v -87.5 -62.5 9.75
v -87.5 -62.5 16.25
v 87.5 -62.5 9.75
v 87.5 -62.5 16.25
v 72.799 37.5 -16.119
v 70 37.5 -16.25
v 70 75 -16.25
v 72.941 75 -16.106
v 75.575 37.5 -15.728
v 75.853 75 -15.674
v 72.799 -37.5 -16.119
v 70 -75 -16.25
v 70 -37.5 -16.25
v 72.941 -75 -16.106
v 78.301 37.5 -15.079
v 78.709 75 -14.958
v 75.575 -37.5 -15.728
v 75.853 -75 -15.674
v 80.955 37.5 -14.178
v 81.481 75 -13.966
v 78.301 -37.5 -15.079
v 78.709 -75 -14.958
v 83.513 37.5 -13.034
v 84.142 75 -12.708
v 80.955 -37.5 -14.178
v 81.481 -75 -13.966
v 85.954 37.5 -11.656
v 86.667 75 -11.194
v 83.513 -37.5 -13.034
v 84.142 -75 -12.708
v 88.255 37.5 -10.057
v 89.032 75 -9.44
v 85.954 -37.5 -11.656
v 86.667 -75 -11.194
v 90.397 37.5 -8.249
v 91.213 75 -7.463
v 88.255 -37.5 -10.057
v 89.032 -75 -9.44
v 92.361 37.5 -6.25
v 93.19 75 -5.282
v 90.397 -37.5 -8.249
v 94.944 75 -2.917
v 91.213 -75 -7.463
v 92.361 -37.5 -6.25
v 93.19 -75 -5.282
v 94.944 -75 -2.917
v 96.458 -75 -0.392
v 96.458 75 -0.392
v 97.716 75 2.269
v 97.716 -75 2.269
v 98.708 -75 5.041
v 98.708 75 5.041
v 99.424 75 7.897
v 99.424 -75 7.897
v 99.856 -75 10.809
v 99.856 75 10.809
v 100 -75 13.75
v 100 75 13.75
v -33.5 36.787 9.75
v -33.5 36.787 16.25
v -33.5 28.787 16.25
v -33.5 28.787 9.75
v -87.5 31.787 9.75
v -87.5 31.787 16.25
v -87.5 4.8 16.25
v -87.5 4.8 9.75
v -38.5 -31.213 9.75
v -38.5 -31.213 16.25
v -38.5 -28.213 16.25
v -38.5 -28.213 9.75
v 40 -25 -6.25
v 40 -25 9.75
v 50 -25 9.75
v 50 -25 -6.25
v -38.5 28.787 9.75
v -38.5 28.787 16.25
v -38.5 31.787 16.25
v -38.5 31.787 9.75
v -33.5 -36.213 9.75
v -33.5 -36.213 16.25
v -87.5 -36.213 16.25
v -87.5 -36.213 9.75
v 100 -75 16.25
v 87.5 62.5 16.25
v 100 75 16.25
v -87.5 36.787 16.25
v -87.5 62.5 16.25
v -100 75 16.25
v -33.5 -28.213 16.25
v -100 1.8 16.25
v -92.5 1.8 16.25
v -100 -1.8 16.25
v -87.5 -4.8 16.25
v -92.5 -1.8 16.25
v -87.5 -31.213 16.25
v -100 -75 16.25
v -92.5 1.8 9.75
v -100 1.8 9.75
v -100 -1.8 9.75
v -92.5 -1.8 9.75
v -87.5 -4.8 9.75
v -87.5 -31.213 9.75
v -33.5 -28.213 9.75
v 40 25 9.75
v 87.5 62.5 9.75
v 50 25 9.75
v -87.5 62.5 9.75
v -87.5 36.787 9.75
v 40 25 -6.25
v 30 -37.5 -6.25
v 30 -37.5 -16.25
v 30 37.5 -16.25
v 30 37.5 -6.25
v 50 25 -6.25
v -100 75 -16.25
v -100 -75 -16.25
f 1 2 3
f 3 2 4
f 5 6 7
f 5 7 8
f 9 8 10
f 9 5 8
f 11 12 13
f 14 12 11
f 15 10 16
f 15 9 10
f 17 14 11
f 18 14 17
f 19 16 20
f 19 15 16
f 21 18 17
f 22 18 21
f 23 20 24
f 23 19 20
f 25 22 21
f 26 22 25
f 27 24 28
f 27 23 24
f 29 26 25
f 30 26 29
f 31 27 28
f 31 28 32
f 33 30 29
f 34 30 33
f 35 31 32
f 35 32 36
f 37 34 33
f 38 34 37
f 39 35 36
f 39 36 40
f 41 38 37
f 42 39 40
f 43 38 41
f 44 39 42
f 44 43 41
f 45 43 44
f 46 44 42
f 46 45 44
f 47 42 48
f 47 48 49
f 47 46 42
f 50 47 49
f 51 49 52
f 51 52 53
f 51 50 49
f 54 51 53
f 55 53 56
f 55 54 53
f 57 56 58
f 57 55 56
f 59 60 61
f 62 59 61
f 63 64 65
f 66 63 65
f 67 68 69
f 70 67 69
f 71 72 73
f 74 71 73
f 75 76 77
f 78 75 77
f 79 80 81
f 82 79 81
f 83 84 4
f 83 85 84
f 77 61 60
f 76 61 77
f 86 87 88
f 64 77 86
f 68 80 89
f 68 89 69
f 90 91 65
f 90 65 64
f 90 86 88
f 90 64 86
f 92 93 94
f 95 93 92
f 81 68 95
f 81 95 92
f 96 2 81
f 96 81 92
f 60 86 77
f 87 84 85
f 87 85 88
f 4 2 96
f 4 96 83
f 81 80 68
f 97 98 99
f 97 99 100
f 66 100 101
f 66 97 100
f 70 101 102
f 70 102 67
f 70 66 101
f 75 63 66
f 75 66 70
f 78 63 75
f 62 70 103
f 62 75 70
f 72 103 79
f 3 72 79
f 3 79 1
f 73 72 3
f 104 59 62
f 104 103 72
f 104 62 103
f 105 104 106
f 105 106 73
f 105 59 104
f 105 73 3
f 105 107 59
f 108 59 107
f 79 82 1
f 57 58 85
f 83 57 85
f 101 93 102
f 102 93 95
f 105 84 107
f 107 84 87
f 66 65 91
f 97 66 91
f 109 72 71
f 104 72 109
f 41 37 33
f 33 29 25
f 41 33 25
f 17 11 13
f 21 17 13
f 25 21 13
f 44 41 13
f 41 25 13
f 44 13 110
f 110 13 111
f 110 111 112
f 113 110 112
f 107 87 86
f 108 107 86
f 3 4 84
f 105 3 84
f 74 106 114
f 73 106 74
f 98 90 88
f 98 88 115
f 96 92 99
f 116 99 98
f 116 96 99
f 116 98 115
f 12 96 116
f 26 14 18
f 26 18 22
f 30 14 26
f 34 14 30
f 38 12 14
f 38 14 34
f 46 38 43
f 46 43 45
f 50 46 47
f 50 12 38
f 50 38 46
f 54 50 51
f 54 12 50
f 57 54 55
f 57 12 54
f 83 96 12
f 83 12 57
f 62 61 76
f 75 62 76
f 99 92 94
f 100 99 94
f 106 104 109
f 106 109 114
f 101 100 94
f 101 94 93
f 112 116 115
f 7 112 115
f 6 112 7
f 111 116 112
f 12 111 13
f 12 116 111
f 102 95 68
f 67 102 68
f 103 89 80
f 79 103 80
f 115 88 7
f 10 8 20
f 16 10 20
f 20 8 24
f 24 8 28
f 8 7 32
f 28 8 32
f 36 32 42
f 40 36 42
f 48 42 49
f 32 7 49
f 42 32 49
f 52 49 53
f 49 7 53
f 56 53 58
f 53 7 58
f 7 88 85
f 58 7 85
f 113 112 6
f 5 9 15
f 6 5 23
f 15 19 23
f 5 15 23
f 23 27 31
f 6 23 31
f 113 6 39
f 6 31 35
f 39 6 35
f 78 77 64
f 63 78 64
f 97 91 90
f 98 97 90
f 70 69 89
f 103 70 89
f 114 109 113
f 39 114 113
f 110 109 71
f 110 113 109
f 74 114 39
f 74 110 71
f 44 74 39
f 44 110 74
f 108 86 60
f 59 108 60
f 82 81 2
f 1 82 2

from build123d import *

# Parameters (mm, degrees)
F1_DEPTH = 75
F2_W     = 10
F2_H     = 12.5
F3_DEPTH = 6.5
F4_DEPTH = 9000
F5_W     = 30
F5_H     = 75
F5_W_2   = 10
F5_H_2   = 50
F6_DEPTH = 10


with BuildPart() as f1:
    # F0 (on Front) → F1 (new body, symmetric)
    with BuildSketch(Plane.XZ):
        with BuildLine():
            Line((100, 13.75), (100, 16.25))
            Line((100, 16.25), (-100, 16.25))
            Line((-100, 16.25), (-100, -16.25))
            Line((-100, -16.25), (70, -16.25))
            ThreePointArc((70, -16.25), (91.2132034356, -7.4632034356), (100, 13.75))
        make_face()
    extrude(amount=F1_DEPTH, both=True)

    # F2 (on face) → F3 (cut)
    with BuildSketch(Plane.XY.offset(16.25)):
        Polygon((87.5, -62.5), (87.5, 62.5), (-87.5, 62.5), (-87.5, 36.7867040902), (-41, 36.7867040902), (-33.5, 36.7867040902), (-33.5, 28.7867040902), (-38.5, 28.7867040902), (-38.5, 31.7867040902), (-46, 31.7867040902), (-87.5, 31.7867040902), (-87.5, 4.8), (-92.5, 1.8), (-100, 1.8), (-100, -1.8), (-92.5, -1.8), (-87.5, -4.8), (-87.5, -31.2132959098), (-38.5, -31.2132959098), (-38.5, -28.2132959098), (-33.5, -28.2132959098), (-33.5, -36.2132959098), (-41, -36.2132959098), (-46, -36.2132959098), (-87.5, -36.2132959098), (-87.5, -62.5), (-77.5, -62.5), align=None)
        Polygon((40, -25), (40, 0), (40, 25), (40, 37.5), (50, 37.5), (50, 25), (50, -25), (50, -37.5), (40, -37.5), align=None, mode=Mode.SUBTRACT)
        with Locations((45, 31.25)):
            Rectangle(F2_W, F2_H)
        with Locations((45, -31.25)):
            Rectangle(F2_W, F2_H)
    extrude(amount=-F3_DEPTH, mode=Mode.SUBTRACT)

    # F4 (cut): a face of the model
    f4_faces = [f1.faces().sort_by_distance(p)[0] for p in [
        (45, 0, 16.25),
    ]]
    extrude(f4_faces, amount=-F4_DEPTH, mode=Mode.SUBTRACT)

    # F5 (on face) → F6 (cut)
    with BuildSketch(Plane(origin=(0, 0, -16.25), x_dir=(1, 0, 0), z_dir=(0, 0, -1))):
        with Locations((85, 0)):
            Rectangle(F5_W, F5_H)
        Polygon((30, 37.5), (30, 0), (30, -37.5), (70, -37.5), (70, 37.5), align=None)
        with Locations((45, 0)):
            Rectangle(F5_W_2, F5_H_2, mode=Mode.SUBTRACT)
    extrude(amount=-F6_DEPTH, mode=Mode.SUBTRACT)


solid = f1.part
